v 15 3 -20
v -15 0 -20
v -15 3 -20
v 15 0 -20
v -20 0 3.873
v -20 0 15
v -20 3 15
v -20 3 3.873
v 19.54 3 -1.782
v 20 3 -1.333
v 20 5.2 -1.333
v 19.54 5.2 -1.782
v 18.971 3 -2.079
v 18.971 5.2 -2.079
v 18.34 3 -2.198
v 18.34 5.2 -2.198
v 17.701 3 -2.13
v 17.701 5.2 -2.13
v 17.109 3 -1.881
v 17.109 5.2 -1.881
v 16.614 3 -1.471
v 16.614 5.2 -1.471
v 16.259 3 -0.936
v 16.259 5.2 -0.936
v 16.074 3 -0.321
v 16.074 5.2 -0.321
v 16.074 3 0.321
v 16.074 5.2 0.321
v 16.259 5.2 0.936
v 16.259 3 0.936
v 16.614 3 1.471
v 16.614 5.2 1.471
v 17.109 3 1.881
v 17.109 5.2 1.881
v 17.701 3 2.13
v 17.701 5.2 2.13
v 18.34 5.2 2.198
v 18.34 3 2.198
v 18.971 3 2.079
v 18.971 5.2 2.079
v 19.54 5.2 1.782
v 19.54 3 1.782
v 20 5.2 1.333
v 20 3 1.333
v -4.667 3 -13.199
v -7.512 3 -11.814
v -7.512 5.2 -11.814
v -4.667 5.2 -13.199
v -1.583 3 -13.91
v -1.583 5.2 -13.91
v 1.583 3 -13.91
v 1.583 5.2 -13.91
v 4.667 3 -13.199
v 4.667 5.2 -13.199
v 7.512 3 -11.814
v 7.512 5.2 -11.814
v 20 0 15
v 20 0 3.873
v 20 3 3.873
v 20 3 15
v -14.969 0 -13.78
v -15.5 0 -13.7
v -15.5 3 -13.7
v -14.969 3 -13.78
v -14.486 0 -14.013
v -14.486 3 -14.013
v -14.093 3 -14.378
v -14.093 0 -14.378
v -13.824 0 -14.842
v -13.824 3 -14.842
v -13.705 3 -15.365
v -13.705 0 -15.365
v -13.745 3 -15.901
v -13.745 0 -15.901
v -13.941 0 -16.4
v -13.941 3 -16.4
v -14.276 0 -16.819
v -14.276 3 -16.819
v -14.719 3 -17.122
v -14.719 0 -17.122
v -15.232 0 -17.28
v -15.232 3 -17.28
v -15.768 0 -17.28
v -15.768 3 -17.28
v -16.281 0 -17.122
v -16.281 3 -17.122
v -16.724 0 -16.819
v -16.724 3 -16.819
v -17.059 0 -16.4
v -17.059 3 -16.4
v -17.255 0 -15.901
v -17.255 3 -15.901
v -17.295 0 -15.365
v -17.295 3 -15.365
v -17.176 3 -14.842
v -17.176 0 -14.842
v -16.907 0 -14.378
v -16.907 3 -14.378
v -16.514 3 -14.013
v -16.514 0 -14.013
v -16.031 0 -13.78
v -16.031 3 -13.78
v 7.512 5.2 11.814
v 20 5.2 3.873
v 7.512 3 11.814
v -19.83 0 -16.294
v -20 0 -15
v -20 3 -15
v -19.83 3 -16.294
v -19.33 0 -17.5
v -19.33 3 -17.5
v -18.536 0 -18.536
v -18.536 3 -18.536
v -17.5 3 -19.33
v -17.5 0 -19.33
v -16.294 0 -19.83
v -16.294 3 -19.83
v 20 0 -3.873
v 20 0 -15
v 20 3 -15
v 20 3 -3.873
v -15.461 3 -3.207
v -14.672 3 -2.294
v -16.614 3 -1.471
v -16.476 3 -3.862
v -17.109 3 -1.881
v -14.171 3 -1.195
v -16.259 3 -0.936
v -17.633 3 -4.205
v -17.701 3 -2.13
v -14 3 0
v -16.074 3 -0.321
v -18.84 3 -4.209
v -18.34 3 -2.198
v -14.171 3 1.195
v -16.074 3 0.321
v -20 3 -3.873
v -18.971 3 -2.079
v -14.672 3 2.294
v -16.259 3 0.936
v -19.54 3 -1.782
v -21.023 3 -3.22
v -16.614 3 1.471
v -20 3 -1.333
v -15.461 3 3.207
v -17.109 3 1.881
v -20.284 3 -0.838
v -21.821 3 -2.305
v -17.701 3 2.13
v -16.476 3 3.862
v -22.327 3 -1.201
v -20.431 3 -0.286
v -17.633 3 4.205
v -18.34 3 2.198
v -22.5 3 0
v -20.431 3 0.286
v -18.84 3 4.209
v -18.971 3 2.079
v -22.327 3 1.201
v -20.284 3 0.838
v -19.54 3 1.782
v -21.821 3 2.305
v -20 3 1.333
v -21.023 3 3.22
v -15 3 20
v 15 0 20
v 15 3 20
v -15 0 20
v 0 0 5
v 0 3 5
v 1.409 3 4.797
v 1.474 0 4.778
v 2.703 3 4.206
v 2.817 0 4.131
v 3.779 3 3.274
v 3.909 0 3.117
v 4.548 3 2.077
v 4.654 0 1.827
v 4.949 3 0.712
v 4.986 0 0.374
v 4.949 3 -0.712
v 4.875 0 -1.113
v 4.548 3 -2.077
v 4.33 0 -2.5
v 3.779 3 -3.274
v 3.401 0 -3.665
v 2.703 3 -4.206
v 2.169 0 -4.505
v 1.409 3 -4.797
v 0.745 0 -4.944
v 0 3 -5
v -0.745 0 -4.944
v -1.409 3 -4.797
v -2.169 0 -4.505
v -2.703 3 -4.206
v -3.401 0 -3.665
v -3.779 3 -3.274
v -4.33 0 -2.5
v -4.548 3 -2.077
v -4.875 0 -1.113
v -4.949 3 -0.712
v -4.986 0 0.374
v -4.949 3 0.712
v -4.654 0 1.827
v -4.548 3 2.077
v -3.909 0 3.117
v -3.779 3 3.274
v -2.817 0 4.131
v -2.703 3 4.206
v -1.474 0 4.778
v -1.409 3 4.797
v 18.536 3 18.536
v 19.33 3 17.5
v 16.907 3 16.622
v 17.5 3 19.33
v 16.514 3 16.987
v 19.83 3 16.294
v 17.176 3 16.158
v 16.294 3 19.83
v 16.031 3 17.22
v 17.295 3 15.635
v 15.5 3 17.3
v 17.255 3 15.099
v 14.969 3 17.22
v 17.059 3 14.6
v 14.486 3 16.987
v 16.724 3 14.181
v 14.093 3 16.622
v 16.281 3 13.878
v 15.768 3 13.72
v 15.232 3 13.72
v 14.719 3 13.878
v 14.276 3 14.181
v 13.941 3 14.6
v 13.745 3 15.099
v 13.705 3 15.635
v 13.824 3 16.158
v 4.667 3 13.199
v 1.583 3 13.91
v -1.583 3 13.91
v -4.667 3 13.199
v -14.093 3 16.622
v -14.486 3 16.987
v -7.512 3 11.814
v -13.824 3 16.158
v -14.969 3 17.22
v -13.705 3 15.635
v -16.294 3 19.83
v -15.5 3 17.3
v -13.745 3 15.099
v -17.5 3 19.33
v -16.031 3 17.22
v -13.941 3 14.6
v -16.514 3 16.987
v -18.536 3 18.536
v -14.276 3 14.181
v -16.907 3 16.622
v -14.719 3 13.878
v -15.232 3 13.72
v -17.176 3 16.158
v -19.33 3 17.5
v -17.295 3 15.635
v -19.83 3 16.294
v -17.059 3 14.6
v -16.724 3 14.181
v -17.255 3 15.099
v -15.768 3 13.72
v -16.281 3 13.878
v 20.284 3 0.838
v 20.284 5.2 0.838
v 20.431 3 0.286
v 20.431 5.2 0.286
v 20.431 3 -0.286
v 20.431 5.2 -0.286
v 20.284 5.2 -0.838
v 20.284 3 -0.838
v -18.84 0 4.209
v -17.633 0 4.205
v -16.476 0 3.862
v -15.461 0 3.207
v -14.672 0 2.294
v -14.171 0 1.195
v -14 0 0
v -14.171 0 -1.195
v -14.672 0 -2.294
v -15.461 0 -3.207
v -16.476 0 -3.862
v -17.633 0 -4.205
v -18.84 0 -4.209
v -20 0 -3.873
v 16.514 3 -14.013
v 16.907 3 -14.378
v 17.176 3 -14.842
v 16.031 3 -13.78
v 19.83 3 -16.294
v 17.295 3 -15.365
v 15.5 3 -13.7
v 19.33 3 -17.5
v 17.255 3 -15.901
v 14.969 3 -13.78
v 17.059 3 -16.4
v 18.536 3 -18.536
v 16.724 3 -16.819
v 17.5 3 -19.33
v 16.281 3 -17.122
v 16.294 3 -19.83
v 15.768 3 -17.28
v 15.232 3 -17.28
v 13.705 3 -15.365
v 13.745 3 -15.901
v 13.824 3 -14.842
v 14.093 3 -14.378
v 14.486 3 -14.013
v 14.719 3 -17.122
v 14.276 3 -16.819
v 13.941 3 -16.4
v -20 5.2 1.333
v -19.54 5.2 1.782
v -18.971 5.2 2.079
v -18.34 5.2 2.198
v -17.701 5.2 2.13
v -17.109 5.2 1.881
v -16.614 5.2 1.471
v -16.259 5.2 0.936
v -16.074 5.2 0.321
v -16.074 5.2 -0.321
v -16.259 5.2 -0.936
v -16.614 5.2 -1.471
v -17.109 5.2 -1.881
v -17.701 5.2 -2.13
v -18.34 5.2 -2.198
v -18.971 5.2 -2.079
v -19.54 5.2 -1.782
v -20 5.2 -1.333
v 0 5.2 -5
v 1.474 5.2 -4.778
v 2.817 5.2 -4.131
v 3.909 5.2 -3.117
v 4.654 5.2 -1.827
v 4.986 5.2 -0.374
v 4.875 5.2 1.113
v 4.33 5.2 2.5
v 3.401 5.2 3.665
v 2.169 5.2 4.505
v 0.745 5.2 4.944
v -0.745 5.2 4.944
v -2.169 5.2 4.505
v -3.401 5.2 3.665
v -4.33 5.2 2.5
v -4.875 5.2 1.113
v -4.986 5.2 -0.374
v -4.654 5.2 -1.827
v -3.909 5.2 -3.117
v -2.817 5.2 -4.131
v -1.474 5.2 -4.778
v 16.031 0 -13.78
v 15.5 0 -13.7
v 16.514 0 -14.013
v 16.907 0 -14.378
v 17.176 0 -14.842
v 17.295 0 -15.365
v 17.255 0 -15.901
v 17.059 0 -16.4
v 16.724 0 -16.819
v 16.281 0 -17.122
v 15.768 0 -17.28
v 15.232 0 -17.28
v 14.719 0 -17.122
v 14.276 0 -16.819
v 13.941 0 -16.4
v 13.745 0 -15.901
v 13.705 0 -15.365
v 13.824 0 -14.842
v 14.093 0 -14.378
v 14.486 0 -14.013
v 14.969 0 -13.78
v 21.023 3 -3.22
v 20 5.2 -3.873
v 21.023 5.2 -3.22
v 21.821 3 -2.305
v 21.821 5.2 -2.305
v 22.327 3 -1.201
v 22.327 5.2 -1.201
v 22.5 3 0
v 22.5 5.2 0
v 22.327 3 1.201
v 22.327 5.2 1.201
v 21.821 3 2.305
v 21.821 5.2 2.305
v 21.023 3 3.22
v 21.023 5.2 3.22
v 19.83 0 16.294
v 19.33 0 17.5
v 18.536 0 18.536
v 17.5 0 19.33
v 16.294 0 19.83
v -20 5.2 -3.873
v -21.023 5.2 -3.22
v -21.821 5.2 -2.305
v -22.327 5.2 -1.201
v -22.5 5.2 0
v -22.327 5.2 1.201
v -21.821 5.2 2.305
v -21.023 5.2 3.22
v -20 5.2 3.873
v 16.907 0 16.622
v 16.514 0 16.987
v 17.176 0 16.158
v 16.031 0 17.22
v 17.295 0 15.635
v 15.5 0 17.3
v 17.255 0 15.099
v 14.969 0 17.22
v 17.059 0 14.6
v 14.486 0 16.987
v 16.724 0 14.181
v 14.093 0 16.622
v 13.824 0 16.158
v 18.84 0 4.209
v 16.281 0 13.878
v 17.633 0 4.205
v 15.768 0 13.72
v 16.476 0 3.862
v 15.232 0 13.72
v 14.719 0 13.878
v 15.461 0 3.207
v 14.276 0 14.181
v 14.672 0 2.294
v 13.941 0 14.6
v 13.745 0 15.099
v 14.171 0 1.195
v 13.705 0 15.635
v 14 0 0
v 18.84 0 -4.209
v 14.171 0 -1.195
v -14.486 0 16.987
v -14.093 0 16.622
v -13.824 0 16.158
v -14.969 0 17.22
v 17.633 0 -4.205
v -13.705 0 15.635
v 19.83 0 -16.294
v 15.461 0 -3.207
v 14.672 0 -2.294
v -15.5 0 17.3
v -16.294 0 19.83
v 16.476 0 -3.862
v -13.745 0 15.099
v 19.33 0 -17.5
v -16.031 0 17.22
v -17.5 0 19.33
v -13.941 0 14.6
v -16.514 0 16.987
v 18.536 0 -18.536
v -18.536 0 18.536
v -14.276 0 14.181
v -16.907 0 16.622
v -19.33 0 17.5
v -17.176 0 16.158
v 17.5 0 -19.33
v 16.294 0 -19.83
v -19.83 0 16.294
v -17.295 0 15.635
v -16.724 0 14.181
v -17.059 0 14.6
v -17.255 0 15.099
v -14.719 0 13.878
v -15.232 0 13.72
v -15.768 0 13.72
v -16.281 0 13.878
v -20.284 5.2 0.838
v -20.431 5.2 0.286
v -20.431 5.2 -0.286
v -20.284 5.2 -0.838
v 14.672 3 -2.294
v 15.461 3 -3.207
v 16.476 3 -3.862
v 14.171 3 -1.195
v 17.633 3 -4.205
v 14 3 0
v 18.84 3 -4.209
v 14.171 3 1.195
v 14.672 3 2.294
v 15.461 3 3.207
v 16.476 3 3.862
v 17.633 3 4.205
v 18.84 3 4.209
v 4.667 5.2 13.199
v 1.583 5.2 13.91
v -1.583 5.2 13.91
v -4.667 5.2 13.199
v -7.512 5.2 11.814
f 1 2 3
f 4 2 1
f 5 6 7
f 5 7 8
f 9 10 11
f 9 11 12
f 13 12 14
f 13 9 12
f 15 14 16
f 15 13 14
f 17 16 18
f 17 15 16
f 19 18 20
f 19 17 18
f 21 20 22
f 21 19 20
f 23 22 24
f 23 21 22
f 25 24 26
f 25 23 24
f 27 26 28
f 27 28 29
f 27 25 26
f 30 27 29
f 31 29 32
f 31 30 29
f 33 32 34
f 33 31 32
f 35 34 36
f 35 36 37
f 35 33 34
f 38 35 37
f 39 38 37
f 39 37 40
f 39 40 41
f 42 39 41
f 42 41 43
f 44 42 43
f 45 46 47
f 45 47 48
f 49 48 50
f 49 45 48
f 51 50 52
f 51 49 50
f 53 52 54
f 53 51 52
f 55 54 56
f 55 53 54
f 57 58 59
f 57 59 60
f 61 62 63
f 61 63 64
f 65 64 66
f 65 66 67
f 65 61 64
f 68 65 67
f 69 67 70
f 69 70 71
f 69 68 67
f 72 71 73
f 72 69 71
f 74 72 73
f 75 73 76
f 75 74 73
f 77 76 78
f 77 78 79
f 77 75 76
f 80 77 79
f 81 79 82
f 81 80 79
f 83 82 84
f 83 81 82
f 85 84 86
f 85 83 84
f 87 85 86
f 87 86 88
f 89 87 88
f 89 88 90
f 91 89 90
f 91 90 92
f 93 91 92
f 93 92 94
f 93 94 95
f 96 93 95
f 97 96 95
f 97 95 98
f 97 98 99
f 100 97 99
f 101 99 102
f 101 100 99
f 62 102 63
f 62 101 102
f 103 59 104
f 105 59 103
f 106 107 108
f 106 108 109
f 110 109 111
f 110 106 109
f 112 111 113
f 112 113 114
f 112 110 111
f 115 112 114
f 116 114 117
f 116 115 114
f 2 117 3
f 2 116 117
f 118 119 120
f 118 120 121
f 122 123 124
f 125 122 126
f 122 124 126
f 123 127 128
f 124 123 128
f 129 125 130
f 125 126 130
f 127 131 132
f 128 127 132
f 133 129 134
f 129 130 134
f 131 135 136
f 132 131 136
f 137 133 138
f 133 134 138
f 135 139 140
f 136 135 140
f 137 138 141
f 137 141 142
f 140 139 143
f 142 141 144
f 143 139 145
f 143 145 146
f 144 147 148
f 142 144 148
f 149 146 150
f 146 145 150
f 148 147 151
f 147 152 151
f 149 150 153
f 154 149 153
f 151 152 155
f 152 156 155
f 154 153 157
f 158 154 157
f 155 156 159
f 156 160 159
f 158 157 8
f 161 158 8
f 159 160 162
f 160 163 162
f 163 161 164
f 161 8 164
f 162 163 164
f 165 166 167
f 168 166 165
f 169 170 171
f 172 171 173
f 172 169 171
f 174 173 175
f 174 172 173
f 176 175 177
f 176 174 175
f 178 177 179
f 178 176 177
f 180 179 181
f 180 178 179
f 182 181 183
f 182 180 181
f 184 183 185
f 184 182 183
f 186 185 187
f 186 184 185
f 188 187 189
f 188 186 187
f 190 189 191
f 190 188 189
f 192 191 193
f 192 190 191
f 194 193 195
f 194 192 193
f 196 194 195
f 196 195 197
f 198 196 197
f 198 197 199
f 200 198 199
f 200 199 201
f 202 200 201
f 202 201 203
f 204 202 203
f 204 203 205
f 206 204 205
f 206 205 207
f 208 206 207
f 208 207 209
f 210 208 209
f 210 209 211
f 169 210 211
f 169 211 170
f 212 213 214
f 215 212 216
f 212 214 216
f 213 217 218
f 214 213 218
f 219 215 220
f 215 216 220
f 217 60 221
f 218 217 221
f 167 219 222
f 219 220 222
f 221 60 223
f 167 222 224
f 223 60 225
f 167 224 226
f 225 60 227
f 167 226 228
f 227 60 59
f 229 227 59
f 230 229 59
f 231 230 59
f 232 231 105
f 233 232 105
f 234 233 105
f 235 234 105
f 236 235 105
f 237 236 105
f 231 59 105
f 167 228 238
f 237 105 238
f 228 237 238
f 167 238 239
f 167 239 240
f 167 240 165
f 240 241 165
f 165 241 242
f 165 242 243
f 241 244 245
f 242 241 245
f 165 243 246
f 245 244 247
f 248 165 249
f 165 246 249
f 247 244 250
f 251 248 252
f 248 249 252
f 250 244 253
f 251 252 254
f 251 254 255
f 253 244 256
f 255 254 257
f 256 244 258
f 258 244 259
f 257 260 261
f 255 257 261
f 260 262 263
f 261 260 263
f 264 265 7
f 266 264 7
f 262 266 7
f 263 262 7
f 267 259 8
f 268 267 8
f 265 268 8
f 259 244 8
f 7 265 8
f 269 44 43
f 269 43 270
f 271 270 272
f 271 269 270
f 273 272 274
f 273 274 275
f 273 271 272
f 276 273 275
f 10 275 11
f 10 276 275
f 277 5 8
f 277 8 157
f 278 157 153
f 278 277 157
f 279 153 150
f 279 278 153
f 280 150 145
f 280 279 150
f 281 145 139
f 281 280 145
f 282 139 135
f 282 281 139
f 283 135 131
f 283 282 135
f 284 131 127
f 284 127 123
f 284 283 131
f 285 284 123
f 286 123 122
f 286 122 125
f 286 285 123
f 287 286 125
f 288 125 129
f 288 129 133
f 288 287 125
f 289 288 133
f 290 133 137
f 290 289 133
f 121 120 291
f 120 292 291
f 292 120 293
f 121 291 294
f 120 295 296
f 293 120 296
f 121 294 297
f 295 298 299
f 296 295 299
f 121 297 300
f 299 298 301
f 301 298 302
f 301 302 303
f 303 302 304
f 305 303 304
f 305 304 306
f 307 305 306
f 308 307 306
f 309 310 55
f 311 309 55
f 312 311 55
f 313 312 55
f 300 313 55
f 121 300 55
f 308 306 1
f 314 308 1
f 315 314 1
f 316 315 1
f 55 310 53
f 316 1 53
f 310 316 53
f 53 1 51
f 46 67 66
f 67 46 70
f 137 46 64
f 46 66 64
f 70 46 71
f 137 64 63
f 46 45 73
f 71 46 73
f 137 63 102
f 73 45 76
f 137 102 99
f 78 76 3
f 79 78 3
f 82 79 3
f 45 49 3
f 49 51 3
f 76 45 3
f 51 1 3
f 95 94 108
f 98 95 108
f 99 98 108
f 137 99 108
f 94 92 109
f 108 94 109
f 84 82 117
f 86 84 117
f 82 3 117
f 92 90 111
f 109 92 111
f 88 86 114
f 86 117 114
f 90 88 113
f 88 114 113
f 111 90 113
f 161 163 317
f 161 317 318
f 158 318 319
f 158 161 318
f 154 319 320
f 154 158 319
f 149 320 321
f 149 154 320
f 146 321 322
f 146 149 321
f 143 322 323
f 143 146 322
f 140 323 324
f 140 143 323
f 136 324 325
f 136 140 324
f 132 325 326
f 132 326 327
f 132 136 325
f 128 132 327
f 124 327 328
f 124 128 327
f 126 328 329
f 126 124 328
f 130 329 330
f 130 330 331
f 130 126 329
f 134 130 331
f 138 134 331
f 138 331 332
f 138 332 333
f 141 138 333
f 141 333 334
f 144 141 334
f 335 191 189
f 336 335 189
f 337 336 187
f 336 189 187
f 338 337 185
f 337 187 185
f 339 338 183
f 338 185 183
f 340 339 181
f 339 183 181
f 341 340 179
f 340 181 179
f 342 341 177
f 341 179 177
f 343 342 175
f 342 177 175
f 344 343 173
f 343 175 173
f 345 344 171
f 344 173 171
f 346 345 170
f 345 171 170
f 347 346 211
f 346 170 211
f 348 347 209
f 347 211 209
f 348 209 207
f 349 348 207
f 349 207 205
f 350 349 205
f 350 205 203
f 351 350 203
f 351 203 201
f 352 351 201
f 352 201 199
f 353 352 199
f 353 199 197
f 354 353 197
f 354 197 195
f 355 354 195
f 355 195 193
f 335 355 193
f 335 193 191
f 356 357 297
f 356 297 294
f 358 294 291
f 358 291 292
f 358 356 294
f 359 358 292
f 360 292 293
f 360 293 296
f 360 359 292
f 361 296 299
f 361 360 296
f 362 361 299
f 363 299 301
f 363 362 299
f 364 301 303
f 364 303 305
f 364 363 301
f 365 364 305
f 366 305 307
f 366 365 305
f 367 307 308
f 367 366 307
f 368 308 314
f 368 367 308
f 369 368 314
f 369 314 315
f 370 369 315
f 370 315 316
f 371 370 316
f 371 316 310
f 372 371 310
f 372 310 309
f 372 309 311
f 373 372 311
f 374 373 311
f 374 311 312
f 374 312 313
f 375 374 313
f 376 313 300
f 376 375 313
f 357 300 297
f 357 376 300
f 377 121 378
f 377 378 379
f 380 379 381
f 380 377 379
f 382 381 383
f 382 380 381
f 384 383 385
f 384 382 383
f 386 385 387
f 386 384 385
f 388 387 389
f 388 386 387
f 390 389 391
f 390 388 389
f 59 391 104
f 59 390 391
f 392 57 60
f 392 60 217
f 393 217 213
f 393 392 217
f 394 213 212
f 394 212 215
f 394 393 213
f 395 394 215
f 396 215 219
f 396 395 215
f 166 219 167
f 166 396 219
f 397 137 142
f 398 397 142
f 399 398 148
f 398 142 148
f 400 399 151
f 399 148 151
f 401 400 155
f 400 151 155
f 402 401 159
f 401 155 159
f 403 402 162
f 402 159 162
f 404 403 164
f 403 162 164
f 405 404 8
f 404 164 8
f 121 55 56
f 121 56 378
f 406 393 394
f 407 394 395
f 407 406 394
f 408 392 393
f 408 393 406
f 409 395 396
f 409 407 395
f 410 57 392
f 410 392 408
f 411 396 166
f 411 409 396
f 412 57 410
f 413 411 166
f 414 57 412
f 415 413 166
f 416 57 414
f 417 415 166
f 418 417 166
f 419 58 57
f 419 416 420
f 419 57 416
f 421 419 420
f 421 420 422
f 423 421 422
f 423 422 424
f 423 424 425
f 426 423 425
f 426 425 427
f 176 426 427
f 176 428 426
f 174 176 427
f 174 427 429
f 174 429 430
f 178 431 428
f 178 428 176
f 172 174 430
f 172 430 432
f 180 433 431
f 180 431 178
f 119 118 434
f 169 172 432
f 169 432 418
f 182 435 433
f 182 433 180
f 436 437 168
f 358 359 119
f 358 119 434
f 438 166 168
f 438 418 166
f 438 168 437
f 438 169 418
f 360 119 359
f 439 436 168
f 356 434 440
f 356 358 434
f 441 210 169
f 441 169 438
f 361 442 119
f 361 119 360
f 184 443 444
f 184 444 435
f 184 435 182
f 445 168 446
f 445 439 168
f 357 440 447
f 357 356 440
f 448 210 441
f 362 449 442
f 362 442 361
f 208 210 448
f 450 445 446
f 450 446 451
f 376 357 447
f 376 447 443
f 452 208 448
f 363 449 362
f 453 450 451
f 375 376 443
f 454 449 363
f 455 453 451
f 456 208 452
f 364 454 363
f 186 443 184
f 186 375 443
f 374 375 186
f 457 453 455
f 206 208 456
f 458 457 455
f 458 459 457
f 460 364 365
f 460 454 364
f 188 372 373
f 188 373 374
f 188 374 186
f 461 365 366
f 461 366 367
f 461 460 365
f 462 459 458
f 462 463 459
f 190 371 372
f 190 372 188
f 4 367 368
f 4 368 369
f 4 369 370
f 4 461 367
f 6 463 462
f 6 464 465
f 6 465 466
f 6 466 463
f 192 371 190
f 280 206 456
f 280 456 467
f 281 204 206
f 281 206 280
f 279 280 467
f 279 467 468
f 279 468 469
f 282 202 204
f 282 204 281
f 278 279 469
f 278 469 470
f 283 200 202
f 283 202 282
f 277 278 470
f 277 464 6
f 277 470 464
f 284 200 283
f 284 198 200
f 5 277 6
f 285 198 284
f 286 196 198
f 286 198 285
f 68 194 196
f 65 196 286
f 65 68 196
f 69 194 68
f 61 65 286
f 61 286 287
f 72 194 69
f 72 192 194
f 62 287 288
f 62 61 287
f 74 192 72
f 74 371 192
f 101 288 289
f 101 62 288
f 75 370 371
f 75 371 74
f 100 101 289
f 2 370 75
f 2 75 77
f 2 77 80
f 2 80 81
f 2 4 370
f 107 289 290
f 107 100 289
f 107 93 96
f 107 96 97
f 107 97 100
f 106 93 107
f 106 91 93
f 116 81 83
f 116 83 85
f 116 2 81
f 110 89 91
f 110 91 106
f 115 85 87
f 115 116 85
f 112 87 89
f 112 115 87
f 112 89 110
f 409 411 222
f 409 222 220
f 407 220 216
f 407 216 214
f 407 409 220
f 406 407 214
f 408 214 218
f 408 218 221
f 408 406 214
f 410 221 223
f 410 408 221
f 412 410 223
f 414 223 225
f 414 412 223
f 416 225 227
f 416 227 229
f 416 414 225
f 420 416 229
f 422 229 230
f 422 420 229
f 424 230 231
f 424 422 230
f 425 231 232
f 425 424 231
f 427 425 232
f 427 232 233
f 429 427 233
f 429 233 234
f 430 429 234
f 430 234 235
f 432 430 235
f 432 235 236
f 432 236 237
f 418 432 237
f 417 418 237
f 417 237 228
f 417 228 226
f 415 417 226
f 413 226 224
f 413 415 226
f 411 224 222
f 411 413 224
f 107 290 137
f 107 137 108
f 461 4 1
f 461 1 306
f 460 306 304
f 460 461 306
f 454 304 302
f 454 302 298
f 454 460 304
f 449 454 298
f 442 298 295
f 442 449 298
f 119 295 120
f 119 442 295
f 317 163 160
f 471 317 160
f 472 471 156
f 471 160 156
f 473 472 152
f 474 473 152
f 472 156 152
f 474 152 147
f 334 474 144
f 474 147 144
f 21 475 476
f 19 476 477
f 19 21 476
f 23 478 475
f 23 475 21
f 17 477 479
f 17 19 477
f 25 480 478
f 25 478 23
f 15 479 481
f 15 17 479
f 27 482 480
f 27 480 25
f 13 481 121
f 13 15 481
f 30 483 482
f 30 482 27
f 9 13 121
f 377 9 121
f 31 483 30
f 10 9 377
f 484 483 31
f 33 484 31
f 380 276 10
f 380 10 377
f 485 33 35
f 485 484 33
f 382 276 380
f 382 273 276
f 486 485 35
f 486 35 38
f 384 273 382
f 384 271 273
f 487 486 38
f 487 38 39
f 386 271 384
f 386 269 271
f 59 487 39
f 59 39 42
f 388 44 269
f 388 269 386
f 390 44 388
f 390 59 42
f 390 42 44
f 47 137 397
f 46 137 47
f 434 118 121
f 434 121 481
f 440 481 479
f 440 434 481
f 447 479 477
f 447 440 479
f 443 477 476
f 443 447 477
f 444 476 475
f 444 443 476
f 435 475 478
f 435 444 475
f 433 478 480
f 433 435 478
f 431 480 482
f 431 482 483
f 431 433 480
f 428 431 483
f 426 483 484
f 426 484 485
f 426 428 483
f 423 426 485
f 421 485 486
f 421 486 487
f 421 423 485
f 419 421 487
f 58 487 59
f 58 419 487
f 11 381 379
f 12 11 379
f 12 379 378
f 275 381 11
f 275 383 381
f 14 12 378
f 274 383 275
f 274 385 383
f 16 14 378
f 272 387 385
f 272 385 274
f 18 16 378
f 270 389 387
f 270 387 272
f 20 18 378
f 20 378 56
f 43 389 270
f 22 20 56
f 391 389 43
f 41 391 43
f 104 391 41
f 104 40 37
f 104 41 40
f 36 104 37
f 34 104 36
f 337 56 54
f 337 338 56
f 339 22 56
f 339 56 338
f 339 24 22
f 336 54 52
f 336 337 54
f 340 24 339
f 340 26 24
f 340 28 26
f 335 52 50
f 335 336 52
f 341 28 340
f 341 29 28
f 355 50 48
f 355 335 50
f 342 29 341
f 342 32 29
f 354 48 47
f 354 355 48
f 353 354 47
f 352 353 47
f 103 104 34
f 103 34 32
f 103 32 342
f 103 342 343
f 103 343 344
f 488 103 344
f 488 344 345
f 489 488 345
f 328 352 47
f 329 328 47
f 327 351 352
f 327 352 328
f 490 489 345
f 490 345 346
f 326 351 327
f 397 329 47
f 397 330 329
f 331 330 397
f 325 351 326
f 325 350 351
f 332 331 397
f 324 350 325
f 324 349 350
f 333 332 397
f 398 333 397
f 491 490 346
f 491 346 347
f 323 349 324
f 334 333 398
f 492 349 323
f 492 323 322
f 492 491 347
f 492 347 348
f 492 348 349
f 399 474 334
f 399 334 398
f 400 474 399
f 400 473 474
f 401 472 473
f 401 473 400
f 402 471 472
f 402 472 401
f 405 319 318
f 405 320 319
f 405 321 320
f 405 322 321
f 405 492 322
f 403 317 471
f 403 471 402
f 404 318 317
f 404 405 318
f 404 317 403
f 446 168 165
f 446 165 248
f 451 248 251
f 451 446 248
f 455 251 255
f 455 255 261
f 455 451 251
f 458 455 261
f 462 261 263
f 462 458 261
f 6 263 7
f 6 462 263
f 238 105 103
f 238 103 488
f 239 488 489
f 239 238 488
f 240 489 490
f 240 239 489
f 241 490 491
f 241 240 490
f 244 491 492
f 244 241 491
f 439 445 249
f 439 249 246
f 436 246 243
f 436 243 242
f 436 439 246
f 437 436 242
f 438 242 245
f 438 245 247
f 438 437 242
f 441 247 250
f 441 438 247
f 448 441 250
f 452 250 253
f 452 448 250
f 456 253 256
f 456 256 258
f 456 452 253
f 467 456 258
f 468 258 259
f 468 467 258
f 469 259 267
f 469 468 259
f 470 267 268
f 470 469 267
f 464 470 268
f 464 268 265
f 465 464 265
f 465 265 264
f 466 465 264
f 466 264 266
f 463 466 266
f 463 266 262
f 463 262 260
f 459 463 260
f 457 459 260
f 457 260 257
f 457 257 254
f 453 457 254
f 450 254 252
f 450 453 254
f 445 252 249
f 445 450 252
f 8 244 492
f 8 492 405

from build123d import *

# Parameters (mm, degrees)
SKETCH_1_R          = 1.8
SKETCH_1_R_2        = 5
EXTRUDE_1_DEPTH     = 3
EXTRUDE_2_DEPTH     = 2.2
SKETCH_3_R          = 5
CUT_EXTRUDE_1_DEPTH = 2.2
EXTRUDE_4_DEPTH     = 2.2
EXTRUDE_5_DEPTH     = 2.2


with BuildPart() as part:
    # 草图1 → 凸台-拉伸1 (new body)
    with BuildSketch(Plane(origin=(0, 0, 0), x_dir=(1, 0, 0), z_dir=(0, 1, 0))):
        with BuildLine():
            Line((20, -3.872983346), (20, -15))
            ThreePointArc((20, -15), (18.535533906, -18.535533906), (15, -20))
            Line((15, -20), (-15, -20))
            ThreePointArc((-15, -20), (-18.535533906, -18.535533906), (-20, -15))
            Line((-20, -15), (-20, -3.872983346))
            ThreePointArc((-20, -3.872983346), (-14, 0), (-20, 3.872983346))
            Line((-20, 3.872983346), (-20, 15))
            ThreePointArc((-20, 15), (-18.535533906, 18.535533906), (-15, 20))
            Line((-15, 20), (15, 20))
            ThreePointArc((15, 20), (18.535533906, 18.535533906), (20, 15))
            Line((20, 15), (20, 3.872983346))
            ThreePointArc((20, 3.872983346), (14, 0), (20, -3.872983346))
        make_face()
        with Locations(Location((-15.5, 15.5, 0), (0, 0, 270))):
            Circle(SKETCH_1_R, mode=Mode.SUBTRACT)
        with Locations(Location((15.5, 15.5, 0), (0, 0, 270))):
            Circle(SKETCH_1_R, mode=Mode.SUBTRACT)
        with Locations(Location((-15.5, -15.5, 0), (0, 0, 270))):
            Circle(SKETCH_1_R, mode=Mode.SUBTRACT)
        with Locations(Location((15.5, -15.5, 0), (0, 0, 270))):
            Circle(SKETCH_1_R, mode=Mode.SUBTRACT)
        with Locations(Location((0, 0, 0), (0, 0, 270))):
            Circle(SKETCH_1_R_2, mode=Mode.SUBTRACT)
    extrude(amount=EXTRUDE_1_DEPTH)

    # 草图2 → 凸台-拉伸2 (add)
    with BuildSketch(Plane(origin=(0, 3, 0), x_dir=(1, 0, 0), z_dir=(0, 1, 0))):
        with BuildLine():
            Line((-20, 3.872983346), (-7.512267775, 11.81379841))
            ThreePointArc((-7.512267775, 11.81379841), (0, 14), (7.512267775, 11.81379841))
            Line((7.512267775, 11.81379841), (20, 3.872983346))
            Line((20, 3.872983346), (20, 1.333229163))
            ThreePointArc((20, 1.333229163), (16.05, 0), (20, -1.333229163))
            Line((20, -1.333229163), (20, -3.872983346))
            Line((20, -3.872983346), (7.512267775, -11.81379841))
            ThreePointArc((7.512267775, -11.81379841), (0, -14), (-7.512267775, -11.81379841))
            Line((-7.512267775, -11.81379841), (-20, -3.872983346))
            Line((-20, -3.872983346), (-20, -1.333229163))
            ThreePointArc((-20, -1.333229163), (-16.05, 0), (-20, 1.333229163))
            Line((-20, 1.333229163), (-20, 3.872983346))
        make_face()
    extrude(amount=EXTRUDE_2_DEPTH)

    # 草图3 → 切除-拉伸1 (cut)
    with BuildSketch(Plane.XZ.offset(-3)):
        with Locations(Location((0, 0, 0), (0, 0, 270))):
            Circle(SKETCH_3_R)
    extrude(amount=-CUT_EXTRUDE_1_DEPTH, mode=Mode.SUBTRACT)

    # 草图4 → 凸台-拉伸4 (add)
    with BuildSketch(Plane.XZ.offset(-3)):
        with BuildLine():
            Line((20, 3.872983346), (20, 1.333229163))
            ThreePointArc((20, 1.333229163), (20.45, 0), (20, -1.333229163))
            Line((20, -1.333229163), (20, -3.872983346))
            ThreePointArc((20, -3.872983346), (22.5, 0), (20, 3.872983346))
        make_face()
    extrude(amount=-EXTRUDE_4_DEPTH)

    # 草图5 → 凸台-拉伸5 (add)
    with BuildSketch(Plane.XZ.offset(-3)):
        with BuildLine():
            Line((-20, 3.872983346), (-20, 1.333229163))
            ThreePointArc((-20, 1.333229163), (-20.45, 0), (-20, -1.333229163))
            Line((-20, -1.333229163), (-20, -3.872983346))
            ThreePointArc((-20, -3.872983346), (-22.5, 0), (-20, 3.872983346))
        make_face()
    extrude(amount=-EXTRUDE_5_DEPTH)


solid = part.part
